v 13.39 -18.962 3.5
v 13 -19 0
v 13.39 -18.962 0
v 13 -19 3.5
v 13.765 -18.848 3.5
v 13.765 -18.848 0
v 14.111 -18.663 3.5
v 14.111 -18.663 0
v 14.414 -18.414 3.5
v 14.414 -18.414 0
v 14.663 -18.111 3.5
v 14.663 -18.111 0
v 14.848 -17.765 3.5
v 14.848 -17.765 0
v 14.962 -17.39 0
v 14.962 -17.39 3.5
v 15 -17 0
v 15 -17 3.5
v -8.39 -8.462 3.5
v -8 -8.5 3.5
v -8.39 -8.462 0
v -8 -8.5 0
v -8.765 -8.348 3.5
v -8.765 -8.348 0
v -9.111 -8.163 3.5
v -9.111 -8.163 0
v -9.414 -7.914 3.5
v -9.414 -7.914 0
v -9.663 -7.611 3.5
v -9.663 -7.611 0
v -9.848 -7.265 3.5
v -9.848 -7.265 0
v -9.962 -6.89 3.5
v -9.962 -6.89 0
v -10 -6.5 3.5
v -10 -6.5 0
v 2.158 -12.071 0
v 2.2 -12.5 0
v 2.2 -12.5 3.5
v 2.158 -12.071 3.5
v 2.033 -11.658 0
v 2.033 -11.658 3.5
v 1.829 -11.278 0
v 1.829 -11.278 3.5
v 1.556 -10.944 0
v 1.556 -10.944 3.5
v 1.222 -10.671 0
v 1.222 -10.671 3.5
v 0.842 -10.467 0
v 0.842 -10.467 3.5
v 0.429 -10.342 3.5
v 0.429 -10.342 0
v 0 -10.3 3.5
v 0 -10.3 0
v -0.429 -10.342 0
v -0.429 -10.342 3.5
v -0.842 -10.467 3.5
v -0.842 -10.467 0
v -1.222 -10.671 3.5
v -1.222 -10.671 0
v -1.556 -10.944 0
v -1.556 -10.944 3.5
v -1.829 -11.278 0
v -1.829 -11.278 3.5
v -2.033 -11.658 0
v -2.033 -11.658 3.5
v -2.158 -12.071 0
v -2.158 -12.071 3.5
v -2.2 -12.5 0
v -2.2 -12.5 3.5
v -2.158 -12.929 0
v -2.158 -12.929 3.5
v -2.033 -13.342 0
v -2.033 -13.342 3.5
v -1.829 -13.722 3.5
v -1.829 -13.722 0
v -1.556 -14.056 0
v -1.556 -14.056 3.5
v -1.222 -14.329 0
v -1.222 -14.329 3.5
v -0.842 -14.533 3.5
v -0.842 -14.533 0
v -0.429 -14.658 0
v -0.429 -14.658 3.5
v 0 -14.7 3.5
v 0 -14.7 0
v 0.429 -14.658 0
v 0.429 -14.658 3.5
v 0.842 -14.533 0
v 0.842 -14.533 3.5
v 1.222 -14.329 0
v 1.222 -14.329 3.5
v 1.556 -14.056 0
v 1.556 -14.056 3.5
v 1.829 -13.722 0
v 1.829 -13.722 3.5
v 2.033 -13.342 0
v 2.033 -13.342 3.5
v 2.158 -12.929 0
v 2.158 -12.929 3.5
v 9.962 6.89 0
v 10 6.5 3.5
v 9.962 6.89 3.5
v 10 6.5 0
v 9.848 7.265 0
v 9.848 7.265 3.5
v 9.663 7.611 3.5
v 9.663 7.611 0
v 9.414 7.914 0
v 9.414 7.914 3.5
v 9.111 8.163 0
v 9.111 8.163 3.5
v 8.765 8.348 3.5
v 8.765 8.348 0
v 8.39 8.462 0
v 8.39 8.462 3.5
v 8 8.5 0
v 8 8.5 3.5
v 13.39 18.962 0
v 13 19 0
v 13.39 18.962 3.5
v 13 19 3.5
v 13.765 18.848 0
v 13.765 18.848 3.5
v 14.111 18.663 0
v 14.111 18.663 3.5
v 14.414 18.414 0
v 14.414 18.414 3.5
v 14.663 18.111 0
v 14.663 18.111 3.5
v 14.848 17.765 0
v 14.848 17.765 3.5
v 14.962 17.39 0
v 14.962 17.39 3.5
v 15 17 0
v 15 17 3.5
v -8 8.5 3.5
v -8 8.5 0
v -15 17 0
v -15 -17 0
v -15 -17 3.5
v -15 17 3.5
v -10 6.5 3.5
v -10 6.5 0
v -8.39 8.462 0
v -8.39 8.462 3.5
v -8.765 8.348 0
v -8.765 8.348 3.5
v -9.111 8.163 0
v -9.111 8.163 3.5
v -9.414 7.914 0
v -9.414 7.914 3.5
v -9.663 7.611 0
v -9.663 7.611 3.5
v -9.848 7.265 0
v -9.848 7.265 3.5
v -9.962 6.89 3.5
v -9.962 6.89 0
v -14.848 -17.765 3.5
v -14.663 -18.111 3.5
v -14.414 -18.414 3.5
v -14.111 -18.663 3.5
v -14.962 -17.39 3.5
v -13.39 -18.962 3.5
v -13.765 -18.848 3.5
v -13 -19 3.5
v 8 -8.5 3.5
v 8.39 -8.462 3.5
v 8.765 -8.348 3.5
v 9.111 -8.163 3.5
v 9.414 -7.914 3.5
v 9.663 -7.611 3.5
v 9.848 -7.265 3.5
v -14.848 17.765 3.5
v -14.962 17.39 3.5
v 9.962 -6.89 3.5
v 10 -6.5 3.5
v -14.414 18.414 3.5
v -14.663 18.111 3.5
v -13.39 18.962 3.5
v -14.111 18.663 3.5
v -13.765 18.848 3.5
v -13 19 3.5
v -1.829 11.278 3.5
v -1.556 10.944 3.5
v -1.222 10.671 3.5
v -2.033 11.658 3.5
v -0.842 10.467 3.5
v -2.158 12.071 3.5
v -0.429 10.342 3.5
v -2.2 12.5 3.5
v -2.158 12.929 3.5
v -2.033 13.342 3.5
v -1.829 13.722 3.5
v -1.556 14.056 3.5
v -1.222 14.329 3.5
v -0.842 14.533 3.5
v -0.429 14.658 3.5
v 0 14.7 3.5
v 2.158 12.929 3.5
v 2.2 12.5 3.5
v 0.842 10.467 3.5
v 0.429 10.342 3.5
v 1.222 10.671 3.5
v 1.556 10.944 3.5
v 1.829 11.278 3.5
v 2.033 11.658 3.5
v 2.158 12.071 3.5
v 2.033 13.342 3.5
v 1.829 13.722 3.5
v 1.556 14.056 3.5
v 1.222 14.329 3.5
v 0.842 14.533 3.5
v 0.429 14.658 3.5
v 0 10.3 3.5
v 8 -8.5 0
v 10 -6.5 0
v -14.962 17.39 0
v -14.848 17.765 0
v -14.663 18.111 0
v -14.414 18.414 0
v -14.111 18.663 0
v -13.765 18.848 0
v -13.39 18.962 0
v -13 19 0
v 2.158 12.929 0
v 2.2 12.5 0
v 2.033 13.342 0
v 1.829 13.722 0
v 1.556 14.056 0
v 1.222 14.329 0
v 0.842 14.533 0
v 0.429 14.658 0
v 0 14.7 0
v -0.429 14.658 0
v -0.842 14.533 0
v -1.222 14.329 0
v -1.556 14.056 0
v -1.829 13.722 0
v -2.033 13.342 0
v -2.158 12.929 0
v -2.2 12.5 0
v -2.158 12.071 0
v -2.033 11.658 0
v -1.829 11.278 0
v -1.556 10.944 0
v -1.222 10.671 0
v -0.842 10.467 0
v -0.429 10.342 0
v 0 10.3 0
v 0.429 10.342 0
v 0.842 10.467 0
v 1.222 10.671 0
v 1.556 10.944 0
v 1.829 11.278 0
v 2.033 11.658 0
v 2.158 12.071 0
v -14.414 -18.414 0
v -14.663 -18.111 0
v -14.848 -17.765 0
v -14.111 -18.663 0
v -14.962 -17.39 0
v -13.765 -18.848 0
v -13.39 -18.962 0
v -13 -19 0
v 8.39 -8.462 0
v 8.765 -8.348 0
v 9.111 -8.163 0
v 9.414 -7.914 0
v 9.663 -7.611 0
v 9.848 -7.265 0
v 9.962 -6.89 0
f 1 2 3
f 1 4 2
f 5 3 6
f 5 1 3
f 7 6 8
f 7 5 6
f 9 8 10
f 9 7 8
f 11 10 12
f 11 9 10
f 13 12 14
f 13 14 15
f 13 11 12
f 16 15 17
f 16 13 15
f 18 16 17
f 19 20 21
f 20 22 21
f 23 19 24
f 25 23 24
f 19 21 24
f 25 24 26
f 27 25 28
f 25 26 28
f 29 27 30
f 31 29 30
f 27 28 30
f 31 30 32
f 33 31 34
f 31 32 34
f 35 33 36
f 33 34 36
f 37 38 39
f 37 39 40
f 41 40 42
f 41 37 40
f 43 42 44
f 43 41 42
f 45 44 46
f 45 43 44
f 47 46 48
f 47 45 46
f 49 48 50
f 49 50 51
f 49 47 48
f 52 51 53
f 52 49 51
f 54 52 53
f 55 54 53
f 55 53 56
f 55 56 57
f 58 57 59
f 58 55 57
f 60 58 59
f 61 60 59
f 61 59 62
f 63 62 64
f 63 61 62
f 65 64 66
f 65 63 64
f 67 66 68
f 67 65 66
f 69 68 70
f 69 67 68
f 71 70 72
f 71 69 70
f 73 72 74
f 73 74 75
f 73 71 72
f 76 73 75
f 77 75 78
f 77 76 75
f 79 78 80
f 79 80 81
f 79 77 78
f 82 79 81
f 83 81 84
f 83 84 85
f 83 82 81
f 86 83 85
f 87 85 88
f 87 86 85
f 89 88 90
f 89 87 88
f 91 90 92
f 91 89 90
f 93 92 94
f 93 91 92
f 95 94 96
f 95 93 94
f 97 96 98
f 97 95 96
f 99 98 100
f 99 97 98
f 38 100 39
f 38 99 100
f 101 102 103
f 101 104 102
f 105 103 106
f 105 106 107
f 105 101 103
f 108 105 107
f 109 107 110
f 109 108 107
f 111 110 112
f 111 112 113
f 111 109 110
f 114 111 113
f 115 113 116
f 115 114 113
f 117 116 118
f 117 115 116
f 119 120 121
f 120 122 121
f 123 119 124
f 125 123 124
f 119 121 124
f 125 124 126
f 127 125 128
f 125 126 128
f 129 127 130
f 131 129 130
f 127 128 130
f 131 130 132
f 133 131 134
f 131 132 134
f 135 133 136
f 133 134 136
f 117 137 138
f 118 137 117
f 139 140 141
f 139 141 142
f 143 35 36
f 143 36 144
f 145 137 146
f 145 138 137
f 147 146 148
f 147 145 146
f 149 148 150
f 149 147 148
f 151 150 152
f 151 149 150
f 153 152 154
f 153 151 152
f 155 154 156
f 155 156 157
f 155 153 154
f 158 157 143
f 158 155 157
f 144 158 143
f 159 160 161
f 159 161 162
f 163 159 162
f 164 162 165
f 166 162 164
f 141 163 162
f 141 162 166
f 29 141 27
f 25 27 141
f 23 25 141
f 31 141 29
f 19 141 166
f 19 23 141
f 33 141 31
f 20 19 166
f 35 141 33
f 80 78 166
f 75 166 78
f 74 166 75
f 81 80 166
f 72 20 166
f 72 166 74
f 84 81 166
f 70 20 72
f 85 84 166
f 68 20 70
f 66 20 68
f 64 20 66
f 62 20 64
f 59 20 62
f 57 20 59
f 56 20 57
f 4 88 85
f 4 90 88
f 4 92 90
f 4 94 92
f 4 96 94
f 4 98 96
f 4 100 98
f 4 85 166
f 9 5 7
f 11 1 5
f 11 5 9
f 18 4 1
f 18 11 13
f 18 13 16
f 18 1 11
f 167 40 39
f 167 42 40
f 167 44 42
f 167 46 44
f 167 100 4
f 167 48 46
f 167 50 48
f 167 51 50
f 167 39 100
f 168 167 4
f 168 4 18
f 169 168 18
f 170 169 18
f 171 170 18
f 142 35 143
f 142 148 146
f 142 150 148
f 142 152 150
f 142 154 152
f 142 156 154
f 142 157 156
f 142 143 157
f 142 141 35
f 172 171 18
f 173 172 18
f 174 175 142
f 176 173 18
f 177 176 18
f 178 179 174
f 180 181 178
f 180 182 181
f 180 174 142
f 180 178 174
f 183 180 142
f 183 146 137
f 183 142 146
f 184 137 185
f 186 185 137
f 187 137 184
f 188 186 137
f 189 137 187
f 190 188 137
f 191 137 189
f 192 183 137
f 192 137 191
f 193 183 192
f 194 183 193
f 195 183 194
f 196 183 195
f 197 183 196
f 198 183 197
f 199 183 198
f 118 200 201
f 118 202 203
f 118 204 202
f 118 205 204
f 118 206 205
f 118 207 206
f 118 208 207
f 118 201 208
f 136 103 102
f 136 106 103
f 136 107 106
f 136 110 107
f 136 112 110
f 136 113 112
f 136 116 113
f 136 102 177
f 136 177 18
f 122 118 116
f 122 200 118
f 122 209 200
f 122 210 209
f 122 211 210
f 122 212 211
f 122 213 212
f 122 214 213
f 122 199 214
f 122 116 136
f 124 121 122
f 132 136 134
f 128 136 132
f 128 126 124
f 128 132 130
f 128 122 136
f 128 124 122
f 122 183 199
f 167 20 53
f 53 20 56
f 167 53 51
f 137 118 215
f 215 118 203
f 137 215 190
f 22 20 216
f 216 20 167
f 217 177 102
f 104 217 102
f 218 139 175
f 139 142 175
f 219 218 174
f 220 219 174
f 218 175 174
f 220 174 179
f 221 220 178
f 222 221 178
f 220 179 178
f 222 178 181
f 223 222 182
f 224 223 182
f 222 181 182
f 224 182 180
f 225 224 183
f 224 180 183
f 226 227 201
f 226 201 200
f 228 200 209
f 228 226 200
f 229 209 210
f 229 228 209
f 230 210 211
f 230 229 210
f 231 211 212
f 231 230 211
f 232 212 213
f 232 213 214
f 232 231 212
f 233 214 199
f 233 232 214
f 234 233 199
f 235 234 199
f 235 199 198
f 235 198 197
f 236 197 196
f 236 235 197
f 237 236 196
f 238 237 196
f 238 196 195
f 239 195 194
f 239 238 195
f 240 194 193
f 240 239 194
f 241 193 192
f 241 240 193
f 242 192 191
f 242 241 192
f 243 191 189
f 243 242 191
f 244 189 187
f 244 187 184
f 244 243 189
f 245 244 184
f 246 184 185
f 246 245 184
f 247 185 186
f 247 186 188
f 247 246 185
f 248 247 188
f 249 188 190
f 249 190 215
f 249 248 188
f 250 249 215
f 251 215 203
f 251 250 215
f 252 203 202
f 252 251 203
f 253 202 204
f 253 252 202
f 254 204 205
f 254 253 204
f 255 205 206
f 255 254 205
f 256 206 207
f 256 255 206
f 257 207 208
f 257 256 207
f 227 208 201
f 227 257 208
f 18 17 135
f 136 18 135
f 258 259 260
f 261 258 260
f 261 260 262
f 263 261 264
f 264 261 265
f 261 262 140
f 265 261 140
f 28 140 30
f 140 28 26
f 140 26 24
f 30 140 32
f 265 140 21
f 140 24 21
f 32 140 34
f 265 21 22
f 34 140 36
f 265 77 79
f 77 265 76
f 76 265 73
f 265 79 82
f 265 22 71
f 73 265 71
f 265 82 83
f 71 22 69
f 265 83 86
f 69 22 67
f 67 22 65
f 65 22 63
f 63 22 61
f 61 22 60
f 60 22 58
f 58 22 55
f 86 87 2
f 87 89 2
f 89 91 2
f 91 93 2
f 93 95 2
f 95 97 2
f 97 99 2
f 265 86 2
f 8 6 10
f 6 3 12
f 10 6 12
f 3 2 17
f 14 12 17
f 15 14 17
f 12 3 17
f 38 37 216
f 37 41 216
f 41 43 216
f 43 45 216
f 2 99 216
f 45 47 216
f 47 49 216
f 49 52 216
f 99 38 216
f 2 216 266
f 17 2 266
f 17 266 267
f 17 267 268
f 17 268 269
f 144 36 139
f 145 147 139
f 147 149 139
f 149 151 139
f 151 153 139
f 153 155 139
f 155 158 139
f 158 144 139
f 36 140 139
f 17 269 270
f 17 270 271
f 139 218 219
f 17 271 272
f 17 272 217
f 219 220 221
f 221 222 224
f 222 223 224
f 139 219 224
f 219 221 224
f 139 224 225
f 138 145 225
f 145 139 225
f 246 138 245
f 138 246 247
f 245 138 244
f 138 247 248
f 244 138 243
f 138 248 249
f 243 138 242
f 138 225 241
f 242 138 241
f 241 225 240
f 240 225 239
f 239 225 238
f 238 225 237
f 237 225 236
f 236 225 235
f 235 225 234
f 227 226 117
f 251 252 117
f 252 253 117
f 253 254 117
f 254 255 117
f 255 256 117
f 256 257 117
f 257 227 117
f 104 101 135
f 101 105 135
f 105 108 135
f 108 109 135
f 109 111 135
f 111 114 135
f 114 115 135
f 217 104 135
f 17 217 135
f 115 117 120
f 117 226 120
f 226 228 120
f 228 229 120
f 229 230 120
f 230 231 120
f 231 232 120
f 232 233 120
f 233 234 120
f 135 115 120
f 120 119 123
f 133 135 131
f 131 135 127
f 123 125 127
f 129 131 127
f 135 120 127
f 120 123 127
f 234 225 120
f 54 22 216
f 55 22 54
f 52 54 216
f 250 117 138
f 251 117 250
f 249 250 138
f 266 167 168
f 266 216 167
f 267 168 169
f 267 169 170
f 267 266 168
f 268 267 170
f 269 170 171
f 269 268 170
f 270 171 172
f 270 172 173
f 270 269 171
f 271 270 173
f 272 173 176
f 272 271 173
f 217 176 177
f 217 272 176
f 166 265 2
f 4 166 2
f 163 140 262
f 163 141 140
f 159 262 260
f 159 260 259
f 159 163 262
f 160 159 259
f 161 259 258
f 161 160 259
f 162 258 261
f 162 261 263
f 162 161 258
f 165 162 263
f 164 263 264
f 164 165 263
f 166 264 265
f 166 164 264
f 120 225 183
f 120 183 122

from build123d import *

# Parameters (mm, degrees)
SKETCH_1_W          = 30
SKETCH_1_H          = 38
SKETCH_1_R          = 2.2
EXTRUDE_1_DEPTH     = 3.5
SKETCH_2_W          = 20
SKETCH_2_H          = 17
CUT_EXTRUDE_1_DEPTH = 10
FILLET_1_R          = 2


with BuildPart() as part:
    # 草图1 → 凸台-拉伸1 (new body)
    with BuildSketch(Plane.XY):
        Rectangle(SKETCH_1_W, SKETCH_1_H)
        with Locations((0, 12.5)):
            Circle(SKETCH_1_R, mode=Mode.SUBTRACT)
        with Locations((0, -12.5)):
            Circle(SKETCH_1_R, mode=Mode.SUBTRACT)
    extrude(amount=EXTRUDE_1_DEPTH)

    # 草图2 → 切除-拉伸1 (cut)
    with BuildSketch(Plane.XY.offset(3.5)):
        Rectangle(SKETCH_2_W, SKETCH_2_H)
    extrude(amount=-CUT_EXTRUDE_1_DEPTH, mode=Mode.SUBTRACT)

    # 圆角1
    fillet_1_edges = [part.edges().sort_by_distance(p)[0] for p in [
        (10, 8.5, 1.75),
        (10, -8.5, 1.75),
        (-10, -8.5, 1.75),
        (-10, 8.5, 1.75),
        (15, -19, 1.75),
        (-15, -19, 1.75),
        (-15, 19, 1.75),
        (15, 19, 1.75),
    ]]
    fillet(fillet_1_edges, radius=FILLET_1_R)


solid = part.part
